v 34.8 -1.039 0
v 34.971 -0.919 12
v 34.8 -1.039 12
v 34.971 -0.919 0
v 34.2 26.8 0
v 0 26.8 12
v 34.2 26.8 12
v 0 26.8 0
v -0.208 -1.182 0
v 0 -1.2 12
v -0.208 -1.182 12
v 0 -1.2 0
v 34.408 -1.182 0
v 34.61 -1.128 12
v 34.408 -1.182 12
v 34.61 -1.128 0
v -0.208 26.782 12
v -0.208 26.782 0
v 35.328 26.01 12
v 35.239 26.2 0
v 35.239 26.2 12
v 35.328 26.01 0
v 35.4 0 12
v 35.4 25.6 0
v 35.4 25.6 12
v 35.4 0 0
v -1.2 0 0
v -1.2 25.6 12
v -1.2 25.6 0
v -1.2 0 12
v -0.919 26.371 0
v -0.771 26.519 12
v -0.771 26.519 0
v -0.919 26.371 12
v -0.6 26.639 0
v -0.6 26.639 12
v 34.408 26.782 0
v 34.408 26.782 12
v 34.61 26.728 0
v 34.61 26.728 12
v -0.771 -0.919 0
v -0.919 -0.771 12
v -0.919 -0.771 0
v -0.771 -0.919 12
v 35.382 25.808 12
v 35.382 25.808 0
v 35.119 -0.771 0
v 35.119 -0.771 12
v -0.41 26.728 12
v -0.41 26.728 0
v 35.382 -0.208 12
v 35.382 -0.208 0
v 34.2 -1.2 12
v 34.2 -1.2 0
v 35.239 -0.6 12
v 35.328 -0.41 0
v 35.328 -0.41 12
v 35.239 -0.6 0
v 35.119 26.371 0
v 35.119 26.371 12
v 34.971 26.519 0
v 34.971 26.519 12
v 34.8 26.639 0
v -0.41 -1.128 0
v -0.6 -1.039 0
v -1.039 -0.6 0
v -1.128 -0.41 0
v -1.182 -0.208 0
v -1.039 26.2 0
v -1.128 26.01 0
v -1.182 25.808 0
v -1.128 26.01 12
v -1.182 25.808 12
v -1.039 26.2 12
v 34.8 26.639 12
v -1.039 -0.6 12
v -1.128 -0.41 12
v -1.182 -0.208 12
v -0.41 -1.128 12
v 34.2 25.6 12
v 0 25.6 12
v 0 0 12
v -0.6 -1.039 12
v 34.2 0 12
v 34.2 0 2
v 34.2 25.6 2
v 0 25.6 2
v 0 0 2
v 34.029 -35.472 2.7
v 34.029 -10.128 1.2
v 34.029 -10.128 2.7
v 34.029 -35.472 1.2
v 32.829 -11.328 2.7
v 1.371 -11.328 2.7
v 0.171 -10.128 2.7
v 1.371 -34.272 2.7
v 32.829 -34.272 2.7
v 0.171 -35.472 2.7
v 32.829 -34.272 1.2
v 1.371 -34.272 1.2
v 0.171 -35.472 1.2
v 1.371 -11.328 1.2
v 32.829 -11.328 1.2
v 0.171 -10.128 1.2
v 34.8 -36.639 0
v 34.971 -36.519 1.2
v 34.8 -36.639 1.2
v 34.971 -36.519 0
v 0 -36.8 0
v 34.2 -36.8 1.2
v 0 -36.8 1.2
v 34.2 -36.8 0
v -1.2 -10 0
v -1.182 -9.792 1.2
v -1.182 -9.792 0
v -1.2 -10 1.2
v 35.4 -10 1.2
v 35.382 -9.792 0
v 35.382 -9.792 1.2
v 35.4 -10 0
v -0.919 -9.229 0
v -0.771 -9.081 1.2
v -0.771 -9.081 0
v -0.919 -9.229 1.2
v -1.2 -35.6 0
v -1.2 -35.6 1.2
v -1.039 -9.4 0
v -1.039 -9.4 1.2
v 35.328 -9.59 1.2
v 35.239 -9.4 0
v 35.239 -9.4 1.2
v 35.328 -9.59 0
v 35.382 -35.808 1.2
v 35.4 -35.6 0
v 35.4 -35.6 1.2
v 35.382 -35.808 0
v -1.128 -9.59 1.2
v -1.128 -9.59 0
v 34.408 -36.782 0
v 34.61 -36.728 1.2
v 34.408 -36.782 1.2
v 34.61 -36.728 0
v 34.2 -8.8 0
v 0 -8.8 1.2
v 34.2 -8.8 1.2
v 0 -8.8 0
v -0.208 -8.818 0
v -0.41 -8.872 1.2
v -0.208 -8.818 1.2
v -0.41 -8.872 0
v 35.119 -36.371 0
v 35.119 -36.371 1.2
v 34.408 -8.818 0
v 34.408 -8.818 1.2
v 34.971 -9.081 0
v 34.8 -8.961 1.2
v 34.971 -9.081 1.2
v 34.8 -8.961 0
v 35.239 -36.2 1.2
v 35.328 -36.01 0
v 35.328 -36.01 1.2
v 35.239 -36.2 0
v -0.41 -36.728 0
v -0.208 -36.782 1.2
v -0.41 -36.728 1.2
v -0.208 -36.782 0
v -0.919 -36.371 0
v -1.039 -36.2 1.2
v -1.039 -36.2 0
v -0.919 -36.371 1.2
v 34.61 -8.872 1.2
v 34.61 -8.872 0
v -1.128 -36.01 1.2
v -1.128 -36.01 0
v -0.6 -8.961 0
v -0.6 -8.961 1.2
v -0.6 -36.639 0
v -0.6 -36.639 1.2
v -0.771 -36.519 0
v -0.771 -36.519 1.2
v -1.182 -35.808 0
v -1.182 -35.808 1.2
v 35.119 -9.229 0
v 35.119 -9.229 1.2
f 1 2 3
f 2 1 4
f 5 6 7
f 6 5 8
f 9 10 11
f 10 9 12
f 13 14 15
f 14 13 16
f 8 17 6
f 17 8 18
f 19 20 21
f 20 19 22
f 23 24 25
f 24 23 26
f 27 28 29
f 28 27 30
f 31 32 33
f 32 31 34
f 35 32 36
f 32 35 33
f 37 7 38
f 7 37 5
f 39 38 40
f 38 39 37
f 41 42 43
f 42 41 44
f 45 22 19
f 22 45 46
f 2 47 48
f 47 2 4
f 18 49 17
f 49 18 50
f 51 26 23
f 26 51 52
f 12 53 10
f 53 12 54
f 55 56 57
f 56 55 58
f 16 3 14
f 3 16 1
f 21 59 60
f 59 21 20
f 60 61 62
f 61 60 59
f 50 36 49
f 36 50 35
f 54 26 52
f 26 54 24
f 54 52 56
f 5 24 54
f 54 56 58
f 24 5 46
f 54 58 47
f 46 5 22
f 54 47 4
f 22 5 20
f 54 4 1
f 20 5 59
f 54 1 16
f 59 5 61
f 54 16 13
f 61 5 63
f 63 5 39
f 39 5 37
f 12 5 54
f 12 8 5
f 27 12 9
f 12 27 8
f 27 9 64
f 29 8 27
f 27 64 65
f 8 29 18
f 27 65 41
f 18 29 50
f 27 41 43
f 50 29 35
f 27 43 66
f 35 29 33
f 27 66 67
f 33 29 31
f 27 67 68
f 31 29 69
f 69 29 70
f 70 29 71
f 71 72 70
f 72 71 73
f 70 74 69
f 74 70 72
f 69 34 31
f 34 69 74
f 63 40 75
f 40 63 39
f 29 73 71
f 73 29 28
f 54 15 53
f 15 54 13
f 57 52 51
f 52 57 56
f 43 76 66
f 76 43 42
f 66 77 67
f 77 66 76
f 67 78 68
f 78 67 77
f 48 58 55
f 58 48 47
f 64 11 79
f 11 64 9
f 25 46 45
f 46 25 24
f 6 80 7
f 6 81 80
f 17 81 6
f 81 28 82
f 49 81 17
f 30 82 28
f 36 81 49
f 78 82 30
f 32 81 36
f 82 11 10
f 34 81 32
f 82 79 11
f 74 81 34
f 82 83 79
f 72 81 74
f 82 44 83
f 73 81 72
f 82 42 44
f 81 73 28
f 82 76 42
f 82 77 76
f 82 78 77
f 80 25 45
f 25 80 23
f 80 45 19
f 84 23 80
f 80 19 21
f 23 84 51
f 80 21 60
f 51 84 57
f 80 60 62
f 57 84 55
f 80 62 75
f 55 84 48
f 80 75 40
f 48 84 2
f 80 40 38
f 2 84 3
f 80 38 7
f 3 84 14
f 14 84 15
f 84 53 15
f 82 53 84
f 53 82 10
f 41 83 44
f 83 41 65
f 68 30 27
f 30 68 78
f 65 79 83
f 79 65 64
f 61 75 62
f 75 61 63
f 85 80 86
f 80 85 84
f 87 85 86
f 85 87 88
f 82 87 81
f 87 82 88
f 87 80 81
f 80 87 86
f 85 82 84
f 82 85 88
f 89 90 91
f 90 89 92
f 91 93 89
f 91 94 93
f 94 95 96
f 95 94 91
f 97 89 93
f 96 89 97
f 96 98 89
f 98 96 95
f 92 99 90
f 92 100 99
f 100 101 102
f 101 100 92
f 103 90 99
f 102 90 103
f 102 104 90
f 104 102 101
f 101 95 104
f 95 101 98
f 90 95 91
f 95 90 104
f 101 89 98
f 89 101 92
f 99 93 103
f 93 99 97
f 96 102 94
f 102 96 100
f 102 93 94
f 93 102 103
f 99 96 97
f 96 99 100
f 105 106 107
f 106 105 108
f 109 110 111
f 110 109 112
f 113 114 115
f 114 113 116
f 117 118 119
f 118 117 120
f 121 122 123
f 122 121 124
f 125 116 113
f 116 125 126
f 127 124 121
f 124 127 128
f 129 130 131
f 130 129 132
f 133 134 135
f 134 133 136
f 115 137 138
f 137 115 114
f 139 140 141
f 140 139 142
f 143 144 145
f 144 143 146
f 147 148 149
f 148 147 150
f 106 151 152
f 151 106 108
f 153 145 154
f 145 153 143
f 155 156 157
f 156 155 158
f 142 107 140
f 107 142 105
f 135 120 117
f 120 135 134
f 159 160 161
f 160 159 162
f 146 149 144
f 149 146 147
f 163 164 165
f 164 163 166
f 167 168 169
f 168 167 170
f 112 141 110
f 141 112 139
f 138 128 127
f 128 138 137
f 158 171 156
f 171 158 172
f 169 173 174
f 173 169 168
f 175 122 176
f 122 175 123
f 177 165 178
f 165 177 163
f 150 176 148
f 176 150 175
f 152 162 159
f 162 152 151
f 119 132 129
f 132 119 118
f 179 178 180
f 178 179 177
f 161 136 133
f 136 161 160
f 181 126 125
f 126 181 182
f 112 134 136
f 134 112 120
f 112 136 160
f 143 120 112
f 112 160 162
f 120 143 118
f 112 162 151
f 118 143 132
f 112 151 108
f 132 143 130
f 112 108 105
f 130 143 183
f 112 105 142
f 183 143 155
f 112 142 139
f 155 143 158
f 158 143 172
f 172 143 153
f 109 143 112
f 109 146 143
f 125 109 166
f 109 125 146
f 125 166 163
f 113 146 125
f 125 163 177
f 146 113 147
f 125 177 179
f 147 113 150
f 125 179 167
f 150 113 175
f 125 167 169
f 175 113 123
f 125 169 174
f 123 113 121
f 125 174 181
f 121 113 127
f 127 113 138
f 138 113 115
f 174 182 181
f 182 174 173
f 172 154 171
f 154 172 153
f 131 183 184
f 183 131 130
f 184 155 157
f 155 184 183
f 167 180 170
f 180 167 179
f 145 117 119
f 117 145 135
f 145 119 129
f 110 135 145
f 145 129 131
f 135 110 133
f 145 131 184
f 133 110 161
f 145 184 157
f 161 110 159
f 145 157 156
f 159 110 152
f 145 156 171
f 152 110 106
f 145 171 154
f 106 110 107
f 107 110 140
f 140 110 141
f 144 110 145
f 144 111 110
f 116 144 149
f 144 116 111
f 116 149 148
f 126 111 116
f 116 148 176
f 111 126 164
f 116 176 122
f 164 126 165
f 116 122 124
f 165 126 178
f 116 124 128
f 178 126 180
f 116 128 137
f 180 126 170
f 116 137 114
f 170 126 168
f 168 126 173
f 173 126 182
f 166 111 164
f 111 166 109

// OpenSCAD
t = 1.2;
t_z = 2;
tolerance = 0.99;

hull_x = 34.2;
hull_y = 25.6;
hull_z = 12.0;

$fn=36;

module hull()
{    
    difference()
    {
        minkowski()
        {
            cube([hull_x, hull_y, hull_z-1]);
            cylinder(r=t, h=1);
        }
    
        translate([0, 0, t_z]) cube([hull_x, hull_y, hull_z-t_z]);
    }
}

module border()
{
    height = 1.5;
    
    difference()
    {
        cube([hull_x*tolerance, hull_y*tolerance, height]);
        translate([t, t, 0]) cube([hull_x*tolerance-2*t, hull_y*tolerance-2*t, height]);
    }
}

module cover()
{
    difference()
    {
        minkowski()
        {
            cube([hull_x, hull_y, t-1]);
            cylinder(r=t, h=1);
        }
    }
    
    translate([(1-tolerance)/2*hull_x,(1-tolerance)/2*hull_y, t]) border();
}

translate([0, 0, 0]) hull();
translate([0, -hull_y-10, 0]) color("red", 1.0) cover();
//translate([0, hull_y, hull_z+1]) rotate([180, 0, 0]) color("red", 1.0) cover();
